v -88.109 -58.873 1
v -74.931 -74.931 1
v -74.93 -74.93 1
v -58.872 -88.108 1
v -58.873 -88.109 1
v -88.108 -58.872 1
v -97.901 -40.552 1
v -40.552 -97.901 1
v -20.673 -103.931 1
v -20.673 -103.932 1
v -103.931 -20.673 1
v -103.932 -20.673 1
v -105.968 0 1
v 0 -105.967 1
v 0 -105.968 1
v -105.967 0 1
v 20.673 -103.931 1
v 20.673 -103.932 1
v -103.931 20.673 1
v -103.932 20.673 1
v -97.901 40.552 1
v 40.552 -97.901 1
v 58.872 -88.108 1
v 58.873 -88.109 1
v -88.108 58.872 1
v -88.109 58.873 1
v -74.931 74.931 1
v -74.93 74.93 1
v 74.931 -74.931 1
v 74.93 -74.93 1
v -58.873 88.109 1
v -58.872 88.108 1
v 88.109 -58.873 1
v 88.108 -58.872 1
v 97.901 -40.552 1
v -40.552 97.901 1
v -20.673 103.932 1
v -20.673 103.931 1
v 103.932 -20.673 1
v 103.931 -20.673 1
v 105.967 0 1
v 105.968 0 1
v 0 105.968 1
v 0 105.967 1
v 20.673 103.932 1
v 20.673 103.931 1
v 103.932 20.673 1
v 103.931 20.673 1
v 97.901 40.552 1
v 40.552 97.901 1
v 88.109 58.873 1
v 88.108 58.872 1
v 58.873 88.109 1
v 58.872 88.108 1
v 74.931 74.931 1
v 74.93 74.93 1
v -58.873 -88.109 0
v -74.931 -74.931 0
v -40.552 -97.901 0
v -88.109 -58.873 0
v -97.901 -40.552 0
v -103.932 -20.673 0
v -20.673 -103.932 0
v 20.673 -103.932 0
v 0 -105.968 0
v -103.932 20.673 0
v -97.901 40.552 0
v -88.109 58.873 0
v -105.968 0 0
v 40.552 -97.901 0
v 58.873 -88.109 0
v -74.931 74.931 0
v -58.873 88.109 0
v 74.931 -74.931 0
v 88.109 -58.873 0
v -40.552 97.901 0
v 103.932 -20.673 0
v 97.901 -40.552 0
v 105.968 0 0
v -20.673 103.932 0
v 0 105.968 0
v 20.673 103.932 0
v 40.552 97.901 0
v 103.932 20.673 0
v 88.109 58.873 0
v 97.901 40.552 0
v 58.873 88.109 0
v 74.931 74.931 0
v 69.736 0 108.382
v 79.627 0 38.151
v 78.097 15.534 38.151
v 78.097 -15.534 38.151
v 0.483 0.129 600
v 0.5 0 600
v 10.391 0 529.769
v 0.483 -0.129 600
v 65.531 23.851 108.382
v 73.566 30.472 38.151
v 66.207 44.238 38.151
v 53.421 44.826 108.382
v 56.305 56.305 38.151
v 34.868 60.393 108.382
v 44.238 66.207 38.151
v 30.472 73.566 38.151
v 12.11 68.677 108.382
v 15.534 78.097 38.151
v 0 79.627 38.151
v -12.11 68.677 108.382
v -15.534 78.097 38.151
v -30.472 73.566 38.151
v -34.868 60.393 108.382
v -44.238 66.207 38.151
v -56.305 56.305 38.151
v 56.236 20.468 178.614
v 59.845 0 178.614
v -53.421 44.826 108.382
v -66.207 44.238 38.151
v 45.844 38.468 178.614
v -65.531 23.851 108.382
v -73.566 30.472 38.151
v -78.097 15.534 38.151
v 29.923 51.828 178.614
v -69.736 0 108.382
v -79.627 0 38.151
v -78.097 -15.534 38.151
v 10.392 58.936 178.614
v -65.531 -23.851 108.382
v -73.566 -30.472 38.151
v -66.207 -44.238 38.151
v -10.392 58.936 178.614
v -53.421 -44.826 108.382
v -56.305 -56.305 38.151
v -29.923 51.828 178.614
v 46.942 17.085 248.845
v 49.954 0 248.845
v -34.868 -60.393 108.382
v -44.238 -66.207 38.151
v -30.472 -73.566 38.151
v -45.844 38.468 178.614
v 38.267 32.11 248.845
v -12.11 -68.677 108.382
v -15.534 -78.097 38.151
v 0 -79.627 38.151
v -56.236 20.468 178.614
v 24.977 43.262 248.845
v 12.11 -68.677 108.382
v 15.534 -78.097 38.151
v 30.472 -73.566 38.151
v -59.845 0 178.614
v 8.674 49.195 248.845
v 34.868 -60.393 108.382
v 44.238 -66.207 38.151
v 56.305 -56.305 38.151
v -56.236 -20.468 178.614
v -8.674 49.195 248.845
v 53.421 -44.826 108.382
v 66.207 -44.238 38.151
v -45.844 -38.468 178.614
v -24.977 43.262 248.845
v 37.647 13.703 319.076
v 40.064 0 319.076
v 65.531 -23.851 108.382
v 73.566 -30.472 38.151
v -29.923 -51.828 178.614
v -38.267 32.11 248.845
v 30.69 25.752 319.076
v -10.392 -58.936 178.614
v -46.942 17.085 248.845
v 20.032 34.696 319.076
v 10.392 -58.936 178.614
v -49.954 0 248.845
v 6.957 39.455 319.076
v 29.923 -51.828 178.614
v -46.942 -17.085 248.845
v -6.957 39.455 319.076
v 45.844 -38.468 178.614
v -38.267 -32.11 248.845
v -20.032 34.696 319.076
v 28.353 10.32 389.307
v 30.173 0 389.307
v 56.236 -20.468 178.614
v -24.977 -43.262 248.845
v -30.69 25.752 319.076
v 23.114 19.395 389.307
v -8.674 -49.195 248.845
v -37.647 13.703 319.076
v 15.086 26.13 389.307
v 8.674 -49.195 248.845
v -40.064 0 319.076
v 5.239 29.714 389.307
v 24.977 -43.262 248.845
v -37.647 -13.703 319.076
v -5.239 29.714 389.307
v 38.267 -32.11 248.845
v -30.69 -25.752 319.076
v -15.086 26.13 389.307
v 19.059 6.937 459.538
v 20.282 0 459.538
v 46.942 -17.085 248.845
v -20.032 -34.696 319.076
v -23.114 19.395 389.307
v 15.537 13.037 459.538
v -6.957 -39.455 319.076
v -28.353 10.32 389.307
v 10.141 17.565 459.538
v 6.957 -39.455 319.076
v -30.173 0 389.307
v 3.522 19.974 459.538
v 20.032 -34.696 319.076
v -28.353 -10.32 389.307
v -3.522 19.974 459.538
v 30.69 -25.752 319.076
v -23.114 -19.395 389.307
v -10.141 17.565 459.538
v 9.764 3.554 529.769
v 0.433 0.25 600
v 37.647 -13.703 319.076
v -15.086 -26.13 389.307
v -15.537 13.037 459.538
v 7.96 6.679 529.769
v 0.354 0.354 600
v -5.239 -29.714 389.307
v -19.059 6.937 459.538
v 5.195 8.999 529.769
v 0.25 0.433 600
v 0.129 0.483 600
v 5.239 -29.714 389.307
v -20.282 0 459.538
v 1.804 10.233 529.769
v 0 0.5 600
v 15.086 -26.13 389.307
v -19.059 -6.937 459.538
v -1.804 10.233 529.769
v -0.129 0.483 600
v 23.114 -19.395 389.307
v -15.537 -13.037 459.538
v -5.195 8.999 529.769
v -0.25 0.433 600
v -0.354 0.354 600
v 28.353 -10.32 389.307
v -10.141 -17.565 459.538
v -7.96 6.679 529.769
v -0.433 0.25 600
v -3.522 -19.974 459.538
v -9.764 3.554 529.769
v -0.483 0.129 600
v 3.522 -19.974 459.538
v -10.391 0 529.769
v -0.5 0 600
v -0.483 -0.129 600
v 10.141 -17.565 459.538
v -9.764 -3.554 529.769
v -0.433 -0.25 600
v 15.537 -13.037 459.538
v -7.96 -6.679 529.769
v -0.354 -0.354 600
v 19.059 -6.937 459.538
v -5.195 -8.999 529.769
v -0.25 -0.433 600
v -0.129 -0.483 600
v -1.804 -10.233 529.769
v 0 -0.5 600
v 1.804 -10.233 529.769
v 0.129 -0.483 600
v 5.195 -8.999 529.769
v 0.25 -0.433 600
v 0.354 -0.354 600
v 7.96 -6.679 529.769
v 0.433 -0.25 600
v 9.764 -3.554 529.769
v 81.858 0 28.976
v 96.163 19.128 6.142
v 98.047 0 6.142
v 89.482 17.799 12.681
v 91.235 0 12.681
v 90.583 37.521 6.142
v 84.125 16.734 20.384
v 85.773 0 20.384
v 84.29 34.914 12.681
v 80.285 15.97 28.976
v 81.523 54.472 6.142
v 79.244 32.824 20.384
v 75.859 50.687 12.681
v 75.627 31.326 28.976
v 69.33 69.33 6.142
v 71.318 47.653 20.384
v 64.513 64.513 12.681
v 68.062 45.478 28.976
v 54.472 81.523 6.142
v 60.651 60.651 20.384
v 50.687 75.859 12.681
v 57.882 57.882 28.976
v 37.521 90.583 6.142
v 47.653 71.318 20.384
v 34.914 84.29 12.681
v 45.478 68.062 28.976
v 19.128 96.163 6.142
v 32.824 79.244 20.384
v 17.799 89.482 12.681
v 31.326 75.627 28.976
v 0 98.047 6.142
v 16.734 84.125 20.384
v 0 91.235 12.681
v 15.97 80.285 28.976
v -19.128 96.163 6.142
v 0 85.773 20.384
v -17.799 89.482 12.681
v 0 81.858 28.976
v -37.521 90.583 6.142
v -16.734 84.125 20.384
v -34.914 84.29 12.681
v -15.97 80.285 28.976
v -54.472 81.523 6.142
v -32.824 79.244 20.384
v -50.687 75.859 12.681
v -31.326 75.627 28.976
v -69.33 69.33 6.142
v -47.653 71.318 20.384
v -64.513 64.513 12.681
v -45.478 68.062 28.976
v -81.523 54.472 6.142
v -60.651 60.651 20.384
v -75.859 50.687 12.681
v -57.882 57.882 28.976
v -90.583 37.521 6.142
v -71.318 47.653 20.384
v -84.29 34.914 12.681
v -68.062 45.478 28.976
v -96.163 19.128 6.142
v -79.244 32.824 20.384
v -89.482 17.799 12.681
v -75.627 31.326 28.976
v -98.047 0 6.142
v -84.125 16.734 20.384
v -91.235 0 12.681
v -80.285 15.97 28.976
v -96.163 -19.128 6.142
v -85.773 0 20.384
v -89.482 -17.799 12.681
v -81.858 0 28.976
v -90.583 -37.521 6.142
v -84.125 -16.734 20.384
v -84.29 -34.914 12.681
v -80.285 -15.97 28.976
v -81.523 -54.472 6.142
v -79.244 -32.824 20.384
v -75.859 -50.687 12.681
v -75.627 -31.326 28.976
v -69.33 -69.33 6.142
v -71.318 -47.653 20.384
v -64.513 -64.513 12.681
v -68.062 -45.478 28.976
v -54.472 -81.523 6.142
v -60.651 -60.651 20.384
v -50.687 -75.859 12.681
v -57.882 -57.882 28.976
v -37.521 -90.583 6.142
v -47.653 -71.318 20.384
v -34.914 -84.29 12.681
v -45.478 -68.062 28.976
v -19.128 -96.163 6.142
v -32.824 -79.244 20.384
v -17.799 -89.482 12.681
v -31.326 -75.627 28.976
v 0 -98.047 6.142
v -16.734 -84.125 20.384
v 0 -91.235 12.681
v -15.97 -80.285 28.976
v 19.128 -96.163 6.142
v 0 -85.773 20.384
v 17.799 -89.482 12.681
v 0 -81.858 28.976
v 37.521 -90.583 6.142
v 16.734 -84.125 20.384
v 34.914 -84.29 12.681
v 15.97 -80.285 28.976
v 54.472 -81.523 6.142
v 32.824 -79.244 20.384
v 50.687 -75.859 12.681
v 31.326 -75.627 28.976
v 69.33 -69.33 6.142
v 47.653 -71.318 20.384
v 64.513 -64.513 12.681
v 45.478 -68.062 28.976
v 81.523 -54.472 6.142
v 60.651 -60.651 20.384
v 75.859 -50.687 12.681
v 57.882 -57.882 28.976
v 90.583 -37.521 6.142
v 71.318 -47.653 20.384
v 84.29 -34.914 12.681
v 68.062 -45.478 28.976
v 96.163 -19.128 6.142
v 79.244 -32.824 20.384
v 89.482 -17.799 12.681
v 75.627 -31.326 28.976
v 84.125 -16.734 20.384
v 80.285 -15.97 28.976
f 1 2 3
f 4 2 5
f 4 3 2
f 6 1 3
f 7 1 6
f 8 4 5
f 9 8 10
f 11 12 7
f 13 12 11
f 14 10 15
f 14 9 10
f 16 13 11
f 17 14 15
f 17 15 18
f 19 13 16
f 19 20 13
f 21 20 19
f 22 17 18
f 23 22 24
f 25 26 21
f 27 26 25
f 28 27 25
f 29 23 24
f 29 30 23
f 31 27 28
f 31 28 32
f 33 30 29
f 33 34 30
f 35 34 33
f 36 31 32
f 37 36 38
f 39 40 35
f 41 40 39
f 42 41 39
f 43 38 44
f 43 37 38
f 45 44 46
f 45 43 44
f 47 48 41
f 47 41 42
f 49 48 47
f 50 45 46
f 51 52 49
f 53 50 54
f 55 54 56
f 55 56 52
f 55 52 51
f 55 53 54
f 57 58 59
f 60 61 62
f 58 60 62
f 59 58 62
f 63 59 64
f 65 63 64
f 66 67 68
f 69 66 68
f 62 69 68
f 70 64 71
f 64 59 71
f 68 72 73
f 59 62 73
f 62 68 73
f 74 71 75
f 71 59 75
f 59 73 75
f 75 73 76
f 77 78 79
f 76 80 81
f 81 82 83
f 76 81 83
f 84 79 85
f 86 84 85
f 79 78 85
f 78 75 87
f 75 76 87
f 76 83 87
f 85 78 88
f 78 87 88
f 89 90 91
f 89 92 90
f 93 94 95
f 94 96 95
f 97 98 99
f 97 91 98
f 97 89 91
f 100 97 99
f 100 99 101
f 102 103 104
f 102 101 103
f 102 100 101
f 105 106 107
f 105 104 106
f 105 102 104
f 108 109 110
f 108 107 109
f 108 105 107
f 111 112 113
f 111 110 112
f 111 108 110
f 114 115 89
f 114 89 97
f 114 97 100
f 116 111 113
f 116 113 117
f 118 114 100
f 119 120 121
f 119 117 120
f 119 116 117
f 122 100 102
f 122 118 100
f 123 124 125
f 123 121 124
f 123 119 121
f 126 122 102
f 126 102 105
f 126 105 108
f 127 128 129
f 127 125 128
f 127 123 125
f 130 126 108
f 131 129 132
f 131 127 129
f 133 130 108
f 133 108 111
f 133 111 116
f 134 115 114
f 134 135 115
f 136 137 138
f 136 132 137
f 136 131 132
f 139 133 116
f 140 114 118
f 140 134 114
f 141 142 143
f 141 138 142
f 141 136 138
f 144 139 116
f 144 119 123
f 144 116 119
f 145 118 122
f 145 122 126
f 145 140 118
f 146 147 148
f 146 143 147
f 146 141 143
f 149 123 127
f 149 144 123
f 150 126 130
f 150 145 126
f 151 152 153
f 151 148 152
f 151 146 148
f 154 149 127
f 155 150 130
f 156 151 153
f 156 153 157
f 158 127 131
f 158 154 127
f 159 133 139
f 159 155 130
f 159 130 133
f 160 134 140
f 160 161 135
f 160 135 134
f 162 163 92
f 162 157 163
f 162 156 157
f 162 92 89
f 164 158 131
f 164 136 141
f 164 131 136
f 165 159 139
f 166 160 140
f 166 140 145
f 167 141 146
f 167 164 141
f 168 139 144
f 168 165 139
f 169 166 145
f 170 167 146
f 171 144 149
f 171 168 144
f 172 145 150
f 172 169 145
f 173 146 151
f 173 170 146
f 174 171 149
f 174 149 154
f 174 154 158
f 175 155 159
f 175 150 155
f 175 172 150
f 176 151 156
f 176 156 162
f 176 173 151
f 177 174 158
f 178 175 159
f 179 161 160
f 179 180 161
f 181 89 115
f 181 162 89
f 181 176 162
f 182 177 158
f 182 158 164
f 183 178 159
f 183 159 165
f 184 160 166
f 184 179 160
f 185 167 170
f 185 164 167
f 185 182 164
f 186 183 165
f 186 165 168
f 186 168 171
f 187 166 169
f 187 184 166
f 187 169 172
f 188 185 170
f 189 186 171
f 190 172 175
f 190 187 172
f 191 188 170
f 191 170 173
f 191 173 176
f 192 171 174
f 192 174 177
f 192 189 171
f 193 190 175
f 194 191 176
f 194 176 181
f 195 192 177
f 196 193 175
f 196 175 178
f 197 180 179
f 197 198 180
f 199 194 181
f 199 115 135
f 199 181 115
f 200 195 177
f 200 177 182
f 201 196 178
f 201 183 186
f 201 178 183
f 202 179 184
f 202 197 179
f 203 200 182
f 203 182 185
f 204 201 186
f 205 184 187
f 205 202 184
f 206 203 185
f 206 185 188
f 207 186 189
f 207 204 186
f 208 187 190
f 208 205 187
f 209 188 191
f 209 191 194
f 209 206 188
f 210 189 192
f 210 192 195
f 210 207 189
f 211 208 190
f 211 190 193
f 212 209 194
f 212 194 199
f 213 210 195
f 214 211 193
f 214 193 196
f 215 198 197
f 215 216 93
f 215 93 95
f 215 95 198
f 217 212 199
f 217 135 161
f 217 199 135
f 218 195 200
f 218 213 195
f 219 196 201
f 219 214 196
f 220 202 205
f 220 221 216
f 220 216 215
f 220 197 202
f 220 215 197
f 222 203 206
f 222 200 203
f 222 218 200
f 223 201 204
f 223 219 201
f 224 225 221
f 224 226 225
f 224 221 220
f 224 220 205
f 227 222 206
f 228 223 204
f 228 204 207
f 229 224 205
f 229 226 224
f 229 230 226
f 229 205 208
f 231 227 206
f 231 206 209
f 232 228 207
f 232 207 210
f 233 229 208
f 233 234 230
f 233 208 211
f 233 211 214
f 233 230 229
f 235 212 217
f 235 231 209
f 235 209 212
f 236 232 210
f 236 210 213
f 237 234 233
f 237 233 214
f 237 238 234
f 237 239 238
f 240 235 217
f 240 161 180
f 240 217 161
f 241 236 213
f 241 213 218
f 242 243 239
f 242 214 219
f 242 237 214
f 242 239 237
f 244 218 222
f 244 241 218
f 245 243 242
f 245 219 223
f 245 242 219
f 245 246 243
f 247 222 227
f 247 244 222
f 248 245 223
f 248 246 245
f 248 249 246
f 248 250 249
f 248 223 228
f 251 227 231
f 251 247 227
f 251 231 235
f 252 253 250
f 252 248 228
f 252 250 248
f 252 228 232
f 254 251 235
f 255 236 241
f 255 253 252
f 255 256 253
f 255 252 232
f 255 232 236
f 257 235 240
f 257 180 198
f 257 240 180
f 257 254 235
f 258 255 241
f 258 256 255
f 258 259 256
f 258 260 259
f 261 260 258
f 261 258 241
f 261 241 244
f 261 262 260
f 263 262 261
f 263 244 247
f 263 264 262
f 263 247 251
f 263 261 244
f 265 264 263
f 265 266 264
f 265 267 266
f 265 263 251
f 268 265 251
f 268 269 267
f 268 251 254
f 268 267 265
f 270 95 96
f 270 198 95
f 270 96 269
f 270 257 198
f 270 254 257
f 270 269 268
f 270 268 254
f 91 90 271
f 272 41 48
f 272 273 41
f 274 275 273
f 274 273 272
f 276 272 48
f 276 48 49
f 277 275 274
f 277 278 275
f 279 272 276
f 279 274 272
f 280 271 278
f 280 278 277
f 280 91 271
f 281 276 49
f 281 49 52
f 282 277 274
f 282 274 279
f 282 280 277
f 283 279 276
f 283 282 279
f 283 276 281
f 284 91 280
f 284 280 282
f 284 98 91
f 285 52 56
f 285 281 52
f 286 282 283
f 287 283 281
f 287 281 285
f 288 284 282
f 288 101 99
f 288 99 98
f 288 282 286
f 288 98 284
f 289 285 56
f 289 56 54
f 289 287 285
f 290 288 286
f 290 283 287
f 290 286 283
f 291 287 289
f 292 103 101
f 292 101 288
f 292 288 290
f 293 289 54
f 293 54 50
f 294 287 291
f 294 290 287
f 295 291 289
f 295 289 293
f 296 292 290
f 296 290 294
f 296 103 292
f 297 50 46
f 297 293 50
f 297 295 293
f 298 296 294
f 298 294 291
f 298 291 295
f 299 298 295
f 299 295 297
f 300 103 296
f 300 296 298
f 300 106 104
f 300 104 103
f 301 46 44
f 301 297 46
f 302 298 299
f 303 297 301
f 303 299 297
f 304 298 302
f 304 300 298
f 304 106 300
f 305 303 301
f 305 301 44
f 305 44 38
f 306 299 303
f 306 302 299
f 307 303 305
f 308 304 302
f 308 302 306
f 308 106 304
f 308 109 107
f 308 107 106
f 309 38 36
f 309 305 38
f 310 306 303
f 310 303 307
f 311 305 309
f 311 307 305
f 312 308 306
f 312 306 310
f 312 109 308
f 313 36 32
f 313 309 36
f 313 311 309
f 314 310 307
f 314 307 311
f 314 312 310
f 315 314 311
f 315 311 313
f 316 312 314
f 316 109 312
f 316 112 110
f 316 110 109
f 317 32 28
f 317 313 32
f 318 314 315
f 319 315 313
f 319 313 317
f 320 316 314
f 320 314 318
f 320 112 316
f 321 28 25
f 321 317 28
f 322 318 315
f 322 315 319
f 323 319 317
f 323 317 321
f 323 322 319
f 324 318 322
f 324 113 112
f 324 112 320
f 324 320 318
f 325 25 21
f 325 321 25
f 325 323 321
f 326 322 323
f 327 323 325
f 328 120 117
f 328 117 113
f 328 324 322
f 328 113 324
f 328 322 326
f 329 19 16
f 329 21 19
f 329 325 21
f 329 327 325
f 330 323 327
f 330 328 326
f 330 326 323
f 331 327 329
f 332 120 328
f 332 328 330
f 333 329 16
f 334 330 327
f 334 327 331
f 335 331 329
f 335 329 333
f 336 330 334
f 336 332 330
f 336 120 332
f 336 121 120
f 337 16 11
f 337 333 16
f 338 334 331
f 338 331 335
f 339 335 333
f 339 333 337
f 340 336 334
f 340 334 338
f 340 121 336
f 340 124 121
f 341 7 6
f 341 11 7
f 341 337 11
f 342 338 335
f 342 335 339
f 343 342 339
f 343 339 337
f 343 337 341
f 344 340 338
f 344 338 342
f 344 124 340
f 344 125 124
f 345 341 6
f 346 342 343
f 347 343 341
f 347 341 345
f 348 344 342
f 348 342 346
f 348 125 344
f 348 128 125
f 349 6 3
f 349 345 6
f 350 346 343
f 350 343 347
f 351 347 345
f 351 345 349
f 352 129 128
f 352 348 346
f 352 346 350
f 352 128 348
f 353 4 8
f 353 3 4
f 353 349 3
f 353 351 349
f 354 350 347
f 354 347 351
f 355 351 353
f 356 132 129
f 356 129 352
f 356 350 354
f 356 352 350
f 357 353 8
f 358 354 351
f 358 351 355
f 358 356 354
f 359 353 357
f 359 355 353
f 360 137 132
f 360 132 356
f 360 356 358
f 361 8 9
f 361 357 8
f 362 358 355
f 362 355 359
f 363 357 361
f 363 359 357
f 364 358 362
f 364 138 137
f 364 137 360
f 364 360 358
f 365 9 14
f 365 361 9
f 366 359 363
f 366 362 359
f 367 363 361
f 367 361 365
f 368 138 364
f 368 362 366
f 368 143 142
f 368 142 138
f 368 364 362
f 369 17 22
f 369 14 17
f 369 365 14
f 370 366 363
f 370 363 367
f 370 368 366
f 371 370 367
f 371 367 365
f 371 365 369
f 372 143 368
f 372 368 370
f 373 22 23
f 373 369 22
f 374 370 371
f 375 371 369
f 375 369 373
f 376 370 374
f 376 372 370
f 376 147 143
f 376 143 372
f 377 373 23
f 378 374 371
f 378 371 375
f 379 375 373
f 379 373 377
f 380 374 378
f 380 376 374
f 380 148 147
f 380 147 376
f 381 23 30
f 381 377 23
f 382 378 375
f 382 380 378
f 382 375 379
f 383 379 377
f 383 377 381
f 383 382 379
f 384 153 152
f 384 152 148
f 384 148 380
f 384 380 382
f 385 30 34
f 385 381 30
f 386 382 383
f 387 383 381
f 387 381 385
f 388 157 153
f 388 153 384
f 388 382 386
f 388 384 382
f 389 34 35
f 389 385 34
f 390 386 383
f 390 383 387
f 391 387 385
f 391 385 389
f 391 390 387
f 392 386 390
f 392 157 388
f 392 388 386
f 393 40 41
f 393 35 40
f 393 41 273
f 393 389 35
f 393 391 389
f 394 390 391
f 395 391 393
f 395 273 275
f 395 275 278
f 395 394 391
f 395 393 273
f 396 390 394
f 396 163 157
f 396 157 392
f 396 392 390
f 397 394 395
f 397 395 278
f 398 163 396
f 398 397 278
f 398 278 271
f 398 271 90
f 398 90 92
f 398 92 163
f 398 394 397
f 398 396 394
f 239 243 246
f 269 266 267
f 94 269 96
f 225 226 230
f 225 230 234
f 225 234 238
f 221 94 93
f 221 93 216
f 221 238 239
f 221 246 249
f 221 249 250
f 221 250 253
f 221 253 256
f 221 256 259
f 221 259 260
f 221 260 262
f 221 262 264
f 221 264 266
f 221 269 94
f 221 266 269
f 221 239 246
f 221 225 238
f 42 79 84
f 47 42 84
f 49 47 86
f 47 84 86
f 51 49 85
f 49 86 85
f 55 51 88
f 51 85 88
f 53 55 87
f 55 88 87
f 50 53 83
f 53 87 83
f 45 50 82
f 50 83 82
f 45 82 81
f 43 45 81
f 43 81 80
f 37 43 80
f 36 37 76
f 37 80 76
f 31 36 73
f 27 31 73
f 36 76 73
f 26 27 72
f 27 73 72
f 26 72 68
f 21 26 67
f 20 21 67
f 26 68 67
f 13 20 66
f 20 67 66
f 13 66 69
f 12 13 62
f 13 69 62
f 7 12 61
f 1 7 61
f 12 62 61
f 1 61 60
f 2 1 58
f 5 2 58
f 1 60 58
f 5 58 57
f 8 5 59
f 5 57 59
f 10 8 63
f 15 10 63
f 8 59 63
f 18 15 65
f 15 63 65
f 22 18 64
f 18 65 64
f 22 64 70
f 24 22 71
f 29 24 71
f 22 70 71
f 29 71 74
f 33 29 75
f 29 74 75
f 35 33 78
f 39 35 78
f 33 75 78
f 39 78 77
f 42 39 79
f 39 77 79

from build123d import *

# Parameters (mm, degrees)
F0_R     = 85
F2_R     = 0.5
F4_R     = 105.9677495378
F5_DEPTH = 1


# Not quite as in the source:
# - a fillet or chamfer that OpenCascade refuses, or shapes differently, is made with other operations: its cross-section is extruded or revolved along the edge and cut away or added


with BuildPart() as f3:
    # F0 (on Top) → F3 section 0
    with BuildSketch(Plane.XY):
        Circle(F0_R)
    # F2 (on offset) → F3 section 1
    with BuildSketch(Plane.XY.offset(600)):
        Circle(F2_R)
    loft()

    # F4 (on Top) → F5 (join)
    with BuildSketch(Plane.XY):
        Circle(F4_R)
    extrude(amount=F5_DEPTH)

    # F6: fillet of radius 50 on 1 edges, made by hand


with BuildPart() as f6_tool2:
    # F6_s3 → F6_t4 (revolve)
    with BuildSketch(Plane.XZ):
        with BuildLine():
            ThreePointArc((105.9675643904, 0.9996454292), (88.2642581979, 16.4841709207), (79.5987288587, 38.349352857))
            Line((79.5987288587, 38.349352857), (74.6474267674, 37.6520444791))
            ThreePointArc((74.6474267674, 37.6520444791), (77.2778437171, 18.9773959421), (79.9078645754, 0.3026916222))
            Line((79.9078645754, 0.3026916222), (84.8591666667, -4.0001631346))
            ThreePointArc((84.8591666667, -4.0001631346), (95.4133655285, -4.0001631346), (103.6531458523, -3.4326336914))
            Line((103.6531458523, -3.4326336914), (105.9675643904, 0.9996454292))
        make_face()
    revolve(axis=Axis((0, 0, 1), (0, 0, 1)))

    split(bisect_by=Plane.XY, keep=Keep.TOP)


with BuildPart() as f3_1:
    add(f3.part)

    # F6_t1: union F6_tool2
    add(f6_tool2.part)


solid = f3_1.part
